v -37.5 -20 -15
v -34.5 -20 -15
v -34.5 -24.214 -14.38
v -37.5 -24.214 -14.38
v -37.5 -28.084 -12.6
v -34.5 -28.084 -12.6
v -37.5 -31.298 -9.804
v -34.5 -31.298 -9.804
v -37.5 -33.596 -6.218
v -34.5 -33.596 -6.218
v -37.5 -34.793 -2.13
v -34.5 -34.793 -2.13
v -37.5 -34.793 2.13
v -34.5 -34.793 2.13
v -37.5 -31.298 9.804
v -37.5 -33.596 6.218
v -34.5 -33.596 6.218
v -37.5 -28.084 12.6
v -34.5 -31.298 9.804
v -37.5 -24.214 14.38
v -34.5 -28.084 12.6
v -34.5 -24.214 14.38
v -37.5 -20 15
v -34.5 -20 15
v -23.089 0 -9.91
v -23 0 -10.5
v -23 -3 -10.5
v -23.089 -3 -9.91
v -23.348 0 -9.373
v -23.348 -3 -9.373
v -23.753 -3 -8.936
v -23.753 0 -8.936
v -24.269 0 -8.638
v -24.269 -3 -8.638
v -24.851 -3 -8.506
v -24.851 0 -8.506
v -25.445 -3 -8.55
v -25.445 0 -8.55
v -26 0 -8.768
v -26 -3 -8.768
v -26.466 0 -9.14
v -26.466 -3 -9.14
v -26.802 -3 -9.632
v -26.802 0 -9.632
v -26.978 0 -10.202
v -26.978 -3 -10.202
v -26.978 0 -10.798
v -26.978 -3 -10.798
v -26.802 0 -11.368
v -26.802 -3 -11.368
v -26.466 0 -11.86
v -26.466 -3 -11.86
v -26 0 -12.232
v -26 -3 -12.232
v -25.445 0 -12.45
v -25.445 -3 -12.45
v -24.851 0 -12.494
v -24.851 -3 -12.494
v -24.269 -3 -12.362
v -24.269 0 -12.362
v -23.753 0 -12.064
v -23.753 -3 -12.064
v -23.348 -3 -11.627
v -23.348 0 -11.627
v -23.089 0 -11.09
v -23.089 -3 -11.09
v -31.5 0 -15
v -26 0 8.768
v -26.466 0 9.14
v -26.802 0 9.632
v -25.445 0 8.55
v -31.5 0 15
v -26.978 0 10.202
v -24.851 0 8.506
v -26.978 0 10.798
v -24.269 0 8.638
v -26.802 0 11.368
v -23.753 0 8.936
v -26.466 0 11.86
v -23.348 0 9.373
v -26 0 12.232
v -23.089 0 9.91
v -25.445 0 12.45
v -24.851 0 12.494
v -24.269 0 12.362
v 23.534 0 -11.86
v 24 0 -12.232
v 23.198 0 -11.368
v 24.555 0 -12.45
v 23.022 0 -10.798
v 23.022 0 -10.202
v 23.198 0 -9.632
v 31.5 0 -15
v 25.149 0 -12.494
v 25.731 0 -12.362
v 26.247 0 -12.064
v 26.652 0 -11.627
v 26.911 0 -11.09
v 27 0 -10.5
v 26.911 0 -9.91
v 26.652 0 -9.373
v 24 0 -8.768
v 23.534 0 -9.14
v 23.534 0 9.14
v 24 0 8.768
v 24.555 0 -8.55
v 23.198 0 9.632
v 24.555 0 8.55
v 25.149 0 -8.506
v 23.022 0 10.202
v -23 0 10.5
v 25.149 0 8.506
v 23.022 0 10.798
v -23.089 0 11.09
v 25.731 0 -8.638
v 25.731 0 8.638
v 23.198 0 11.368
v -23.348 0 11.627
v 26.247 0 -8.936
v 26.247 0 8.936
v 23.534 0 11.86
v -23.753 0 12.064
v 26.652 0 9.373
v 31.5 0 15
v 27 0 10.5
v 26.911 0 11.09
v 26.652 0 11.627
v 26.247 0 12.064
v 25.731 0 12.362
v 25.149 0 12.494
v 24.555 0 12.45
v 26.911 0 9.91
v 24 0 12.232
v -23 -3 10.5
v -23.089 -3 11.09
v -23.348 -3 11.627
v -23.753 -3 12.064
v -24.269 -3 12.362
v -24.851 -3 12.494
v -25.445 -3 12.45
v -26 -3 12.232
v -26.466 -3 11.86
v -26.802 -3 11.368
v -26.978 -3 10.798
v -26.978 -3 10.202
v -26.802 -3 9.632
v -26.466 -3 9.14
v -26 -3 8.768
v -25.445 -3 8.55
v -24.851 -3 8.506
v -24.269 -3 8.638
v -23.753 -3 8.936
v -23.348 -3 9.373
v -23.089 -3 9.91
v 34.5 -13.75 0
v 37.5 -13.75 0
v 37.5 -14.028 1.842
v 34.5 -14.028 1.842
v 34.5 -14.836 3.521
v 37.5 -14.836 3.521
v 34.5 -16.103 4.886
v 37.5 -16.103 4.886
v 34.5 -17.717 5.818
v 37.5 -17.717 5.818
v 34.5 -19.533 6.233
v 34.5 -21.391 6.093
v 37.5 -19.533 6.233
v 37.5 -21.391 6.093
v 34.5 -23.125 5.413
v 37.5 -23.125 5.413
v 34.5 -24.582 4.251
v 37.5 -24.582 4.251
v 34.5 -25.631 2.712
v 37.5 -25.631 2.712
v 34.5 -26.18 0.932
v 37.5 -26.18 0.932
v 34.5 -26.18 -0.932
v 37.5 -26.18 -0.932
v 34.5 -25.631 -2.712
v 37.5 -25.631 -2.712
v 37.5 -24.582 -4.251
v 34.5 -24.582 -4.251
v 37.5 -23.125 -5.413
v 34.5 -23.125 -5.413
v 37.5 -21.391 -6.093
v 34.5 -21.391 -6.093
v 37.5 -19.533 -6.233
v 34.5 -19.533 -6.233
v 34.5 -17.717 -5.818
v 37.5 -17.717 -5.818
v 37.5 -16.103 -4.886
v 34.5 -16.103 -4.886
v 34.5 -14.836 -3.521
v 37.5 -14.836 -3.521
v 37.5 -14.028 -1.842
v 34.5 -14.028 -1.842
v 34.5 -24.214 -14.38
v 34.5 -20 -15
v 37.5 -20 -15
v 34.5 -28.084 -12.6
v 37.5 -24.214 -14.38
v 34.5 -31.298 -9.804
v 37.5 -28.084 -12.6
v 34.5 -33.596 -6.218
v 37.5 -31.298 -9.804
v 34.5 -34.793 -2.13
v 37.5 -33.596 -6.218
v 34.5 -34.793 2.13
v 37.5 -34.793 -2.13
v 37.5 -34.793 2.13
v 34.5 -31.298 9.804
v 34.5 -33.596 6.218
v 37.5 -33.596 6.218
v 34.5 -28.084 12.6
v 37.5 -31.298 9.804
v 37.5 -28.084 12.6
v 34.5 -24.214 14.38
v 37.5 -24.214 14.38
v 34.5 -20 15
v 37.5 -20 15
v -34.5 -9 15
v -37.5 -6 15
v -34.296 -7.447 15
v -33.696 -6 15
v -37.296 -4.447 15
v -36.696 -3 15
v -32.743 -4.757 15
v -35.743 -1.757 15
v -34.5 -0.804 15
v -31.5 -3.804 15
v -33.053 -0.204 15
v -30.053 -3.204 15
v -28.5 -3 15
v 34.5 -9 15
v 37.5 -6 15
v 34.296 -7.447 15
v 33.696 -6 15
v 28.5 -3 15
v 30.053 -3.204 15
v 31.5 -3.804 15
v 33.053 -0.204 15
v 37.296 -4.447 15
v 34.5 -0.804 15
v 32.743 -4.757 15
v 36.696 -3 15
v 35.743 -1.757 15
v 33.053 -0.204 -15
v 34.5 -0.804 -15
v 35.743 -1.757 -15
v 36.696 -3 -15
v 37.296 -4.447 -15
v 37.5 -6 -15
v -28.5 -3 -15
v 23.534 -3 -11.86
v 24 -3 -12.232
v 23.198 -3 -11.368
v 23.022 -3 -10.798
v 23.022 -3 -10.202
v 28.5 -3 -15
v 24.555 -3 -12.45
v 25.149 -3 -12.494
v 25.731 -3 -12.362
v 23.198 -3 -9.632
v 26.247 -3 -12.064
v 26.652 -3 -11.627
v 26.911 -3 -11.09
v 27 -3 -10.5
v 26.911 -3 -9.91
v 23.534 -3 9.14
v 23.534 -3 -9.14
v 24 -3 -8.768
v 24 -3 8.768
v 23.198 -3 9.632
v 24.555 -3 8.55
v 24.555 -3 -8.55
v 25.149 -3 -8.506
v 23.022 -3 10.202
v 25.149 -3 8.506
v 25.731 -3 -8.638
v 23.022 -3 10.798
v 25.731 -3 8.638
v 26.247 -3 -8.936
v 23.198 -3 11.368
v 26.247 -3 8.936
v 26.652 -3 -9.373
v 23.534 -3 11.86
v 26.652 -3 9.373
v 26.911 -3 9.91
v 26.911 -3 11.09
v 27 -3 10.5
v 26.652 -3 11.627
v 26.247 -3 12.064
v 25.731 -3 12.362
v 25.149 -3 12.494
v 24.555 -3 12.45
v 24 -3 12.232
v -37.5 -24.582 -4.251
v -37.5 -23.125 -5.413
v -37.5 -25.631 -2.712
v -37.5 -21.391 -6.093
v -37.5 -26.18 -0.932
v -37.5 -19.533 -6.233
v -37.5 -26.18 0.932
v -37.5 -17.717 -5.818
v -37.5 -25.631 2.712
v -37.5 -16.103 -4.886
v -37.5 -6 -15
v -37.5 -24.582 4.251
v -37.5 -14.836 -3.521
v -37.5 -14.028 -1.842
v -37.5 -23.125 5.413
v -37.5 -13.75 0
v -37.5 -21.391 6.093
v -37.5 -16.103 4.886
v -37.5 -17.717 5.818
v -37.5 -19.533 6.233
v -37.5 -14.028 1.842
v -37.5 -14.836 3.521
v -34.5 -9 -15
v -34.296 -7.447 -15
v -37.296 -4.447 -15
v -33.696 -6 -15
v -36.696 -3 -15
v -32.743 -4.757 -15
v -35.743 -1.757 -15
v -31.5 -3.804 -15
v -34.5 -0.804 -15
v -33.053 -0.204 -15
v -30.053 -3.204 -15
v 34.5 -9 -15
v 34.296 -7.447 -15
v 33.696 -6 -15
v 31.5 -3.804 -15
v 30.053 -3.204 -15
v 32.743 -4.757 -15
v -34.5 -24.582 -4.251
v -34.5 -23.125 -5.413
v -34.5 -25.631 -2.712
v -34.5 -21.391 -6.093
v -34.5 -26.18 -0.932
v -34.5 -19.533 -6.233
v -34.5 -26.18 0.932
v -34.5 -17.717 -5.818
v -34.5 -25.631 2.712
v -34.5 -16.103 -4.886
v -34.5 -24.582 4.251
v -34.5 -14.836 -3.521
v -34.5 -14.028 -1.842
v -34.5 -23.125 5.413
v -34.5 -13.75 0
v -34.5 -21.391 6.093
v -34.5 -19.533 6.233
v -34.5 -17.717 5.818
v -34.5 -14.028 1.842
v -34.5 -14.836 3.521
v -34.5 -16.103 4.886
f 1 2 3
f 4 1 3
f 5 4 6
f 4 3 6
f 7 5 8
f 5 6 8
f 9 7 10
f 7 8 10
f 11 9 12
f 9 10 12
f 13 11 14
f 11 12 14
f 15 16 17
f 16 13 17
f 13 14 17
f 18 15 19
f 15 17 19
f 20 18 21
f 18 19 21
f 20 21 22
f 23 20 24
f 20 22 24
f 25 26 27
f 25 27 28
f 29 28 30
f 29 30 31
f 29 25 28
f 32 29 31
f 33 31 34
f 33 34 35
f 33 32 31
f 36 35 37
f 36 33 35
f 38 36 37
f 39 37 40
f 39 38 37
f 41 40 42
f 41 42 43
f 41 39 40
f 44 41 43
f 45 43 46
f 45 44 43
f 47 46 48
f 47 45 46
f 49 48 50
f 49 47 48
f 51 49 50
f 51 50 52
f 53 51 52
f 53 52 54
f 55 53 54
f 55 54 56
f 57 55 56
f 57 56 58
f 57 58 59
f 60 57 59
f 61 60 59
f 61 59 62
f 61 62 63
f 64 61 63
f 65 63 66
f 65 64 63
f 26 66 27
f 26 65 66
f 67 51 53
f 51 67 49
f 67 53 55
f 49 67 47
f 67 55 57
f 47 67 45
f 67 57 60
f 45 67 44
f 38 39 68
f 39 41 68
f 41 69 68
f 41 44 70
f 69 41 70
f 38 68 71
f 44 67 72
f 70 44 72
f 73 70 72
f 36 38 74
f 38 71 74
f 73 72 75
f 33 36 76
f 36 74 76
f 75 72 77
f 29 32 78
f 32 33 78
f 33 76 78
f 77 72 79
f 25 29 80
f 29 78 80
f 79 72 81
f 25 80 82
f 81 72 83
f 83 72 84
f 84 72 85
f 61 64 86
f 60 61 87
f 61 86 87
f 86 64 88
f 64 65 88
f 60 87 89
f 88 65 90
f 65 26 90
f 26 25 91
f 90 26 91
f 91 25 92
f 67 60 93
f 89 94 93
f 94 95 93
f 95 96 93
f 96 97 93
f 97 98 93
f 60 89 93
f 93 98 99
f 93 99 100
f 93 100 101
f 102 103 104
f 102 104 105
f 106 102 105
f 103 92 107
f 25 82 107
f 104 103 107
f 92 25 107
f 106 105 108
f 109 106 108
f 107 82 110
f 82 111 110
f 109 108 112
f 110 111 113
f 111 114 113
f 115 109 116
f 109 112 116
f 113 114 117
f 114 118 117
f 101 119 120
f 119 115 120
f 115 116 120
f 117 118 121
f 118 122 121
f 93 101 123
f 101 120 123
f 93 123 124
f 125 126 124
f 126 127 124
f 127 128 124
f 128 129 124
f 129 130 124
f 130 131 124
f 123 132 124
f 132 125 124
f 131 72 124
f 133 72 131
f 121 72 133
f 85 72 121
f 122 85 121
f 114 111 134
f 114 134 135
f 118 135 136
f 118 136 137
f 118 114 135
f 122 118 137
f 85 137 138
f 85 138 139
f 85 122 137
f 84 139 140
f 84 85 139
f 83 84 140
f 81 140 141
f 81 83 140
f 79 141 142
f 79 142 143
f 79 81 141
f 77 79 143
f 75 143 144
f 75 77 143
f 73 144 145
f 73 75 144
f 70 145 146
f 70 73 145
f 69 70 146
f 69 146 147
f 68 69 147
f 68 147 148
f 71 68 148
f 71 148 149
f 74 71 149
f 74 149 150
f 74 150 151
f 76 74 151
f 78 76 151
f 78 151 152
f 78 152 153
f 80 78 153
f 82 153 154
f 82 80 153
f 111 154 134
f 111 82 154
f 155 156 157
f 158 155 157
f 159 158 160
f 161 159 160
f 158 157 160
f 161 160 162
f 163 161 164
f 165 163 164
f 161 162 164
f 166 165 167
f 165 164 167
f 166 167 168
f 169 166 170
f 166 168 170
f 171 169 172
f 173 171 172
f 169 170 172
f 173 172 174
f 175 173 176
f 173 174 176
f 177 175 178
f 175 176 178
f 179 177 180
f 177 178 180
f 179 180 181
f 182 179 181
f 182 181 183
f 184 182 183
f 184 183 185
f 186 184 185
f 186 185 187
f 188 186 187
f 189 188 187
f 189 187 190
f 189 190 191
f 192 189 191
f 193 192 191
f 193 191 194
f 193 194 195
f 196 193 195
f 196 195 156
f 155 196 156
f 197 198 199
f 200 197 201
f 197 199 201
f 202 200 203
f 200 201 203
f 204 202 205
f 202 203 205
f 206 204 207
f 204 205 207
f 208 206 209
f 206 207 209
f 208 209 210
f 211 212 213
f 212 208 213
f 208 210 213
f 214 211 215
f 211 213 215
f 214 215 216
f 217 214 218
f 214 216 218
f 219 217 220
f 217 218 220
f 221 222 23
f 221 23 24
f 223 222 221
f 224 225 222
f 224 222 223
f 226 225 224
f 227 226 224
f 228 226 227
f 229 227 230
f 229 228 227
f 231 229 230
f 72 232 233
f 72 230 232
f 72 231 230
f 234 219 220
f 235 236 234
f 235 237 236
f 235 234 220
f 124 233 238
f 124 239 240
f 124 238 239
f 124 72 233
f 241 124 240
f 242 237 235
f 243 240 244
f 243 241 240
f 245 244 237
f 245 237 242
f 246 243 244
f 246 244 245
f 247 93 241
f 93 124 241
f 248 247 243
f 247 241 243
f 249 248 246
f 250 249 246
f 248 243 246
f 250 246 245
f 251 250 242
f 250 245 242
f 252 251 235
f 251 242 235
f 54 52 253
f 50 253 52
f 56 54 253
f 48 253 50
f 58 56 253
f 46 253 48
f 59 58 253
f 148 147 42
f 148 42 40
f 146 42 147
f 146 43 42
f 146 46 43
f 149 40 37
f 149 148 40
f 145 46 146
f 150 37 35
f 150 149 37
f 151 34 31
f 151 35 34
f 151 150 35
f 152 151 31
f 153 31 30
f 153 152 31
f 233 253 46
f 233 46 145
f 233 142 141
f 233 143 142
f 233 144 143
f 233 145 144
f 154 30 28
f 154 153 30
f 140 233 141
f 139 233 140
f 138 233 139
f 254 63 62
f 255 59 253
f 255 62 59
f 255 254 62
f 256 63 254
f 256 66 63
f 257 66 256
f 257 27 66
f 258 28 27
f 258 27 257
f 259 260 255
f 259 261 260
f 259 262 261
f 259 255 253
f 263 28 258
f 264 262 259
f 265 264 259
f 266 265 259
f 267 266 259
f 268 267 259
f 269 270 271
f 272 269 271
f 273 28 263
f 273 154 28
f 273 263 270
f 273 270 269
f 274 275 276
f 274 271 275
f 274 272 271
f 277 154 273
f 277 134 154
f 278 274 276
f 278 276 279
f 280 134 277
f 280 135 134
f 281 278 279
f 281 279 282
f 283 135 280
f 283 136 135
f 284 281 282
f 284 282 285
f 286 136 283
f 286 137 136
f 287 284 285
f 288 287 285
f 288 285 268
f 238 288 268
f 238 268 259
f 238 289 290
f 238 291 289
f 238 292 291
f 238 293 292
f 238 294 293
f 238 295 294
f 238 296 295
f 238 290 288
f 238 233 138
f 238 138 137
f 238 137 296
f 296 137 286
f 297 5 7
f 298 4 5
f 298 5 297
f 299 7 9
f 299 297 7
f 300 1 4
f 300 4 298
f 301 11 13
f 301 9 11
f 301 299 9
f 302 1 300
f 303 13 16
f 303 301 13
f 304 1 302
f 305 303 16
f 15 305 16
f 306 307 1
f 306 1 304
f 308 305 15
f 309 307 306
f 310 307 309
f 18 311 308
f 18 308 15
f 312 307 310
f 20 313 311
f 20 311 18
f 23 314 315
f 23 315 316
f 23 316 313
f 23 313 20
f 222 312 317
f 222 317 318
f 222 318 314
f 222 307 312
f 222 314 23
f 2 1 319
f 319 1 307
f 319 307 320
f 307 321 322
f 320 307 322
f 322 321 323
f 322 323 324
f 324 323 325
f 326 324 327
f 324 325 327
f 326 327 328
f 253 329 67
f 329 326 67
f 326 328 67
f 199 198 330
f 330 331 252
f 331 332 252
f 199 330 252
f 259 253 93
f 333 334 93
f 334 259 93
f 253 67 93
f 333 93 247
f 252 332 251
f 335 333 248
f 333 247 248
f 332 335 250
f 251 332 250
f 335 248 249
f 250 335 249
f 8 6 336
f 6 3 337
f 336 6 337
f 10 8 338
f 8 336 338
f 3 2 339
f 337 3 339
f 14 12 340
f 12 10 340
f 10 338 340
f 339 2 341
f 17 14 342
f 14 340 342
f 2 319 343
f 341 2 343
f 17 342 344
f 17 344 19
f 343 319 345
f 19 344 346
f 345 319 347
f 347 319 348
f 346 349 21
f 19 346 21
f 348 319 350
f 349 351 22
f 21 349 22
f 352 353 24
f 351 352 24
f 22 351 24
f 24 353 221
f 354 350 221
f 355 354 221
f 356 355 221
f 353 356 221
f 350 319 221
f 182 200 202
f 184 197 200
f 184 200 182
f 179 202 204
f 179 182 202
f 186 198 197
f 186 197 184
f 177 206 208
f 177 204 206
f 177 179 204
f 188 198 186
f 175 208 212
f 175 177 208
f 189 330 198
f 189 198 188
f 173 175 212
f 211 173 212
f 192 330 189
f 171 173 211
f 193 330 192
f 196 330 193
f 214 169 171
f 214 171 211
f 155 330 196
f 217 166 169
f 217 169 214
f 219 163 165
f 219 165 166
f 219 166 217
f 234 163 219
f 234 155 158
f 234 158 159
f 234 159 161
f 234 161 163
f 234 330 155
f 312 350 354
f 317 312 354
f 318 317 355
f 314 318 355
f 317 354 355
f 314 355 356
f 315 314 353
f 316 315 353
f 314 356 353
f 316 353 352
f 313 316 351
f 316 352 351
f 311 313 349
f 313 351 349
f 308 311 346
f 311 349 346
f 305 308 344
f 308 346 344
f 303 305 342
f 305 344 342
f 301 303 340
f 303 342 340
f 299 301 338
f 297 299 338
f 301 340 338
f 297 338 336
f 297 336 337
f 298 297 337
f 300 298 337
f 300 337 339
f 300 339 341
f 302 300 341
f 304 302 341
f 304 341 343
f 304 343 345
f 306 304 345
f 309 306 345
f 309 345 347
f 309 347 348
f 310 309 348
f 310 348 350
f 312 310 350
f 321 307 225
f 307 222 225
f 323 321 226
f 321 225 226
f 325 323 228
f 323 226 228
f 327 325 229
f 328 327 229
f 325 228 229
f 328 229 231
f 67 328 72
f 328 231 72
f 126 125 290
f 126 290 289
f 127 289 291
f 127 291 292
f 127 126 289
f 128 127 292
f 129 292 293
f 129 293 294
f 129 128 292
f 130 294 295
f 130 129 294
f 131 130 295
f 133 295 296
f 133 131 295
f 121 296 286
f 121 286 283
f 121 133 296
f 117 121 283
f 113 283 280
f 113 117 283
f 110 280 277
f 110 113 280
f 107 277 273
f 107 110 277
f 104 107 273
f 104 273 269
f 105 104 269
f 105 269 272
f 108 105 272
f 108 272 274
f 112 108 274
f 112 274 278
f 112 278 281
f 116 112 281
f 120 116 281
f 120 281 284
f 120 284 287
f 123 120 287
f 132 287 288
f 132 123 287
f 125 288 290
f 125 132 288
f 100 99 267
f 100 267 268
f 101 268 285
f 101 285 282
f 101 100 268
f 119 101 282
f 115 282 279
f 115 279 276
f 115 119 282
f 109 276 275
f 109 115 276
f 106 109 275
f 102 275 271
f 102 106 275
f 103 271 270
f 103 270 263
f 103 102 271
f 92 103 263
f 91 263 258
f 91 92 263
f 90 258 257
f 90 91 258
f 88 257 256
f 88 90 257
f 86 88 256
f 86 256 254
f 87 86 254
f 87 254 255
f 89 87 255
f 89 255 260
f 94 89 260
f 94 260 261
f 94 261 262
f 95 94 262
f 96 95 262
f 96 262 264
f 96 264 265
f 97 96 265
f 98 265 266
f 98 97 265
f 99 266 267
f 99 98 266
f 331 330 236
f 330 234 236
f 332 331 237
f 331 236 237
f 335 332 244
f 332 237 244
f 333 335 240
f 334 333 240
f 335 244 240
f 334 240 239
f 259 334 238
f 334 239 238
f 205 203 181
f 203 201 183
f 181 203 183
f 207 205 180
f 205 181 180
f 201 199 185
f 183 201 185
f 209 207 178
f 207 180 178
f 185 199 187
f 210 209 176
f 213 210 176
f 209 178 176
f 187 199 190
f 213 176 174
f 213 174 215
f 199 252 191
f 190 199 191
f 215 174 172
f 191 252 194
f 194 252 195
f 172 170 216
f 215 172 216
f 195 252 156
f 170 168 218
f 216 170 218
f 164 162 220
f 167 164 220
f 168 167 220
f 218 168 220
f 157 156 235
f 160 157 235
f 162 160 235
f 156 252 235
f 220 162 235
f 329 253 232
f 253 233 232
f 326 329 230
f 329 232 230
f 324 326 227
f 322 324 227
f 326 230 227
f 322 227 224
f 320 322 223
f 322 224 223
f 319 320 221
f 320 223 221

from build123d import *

# Parameters (mm, degrees)
F0_W     = 75
F0_H     = 30
F0_R     = 2
F1_DEPTH = 3
F2_W     = 3
F2_H     = 30
F3_DEPTH = 37
F4_R     = 6.25
F5_DEPTH = 2500
F6_R     = 6


with BuildPart() as f1:
    # F0 (on Front) → F1 (new body)
    with BuildSketch(Plane.XZ):
        Rectangle(F0_W, F0_H)
        with Locations((-25, -10.5)):
            Circle(F0_R, mode=Mode.SUBTRACT)
        with Locations((25, -10.5)):
            Circle(F0_R, mode=Mode.SUBTRACT)
        with Locations((-25, 10.5)):
            Circle(F0_R, mode=Mode.SUBTRACT)
        with Locations((25, 10.5)):
            Circle(F0_R, mode=Mode.SUBTRACT)
    extrude(amount=F1_DEPTH)

    # F2 (on face) → F3 (join)
    with BuildSketch(Plane.XZ.offset(3)):
        with Locations((-36, 0)):
            Rectangle(F2_W, F2_H)
        with Locations((36, 0)):
            Rectangle(F2_W, F2_H)
    extrude(amount=F3_DEPTH)

    # F4 (on face) → F5 (cut)
    with BuildSketch(Plane.YZ.offset(37.5)):
        with Locations((-20, 0)):
            Circle(F4_R)
        with BuildLine():
            ThreePointArc((-20, -15), (-34.945094, 0), (-20, 15))
            Line((-20, 15), (-40, 15))
            Line((-40, 15), (-40, -15))
            Line((-40, -15), (-20, -15))
        make_face()
    extrude(amount=-F5_DEPTH, mode=Mode.SUBTRACT)

    # F6
    f6_edges = [f1.edges().sort_by_distance(p)[0] for p in [
        (37.5, 0, 0),
        (-37.5, 0, 0),
        (-34.5, -3, 0),
        (34.5, -3, 0),
    ]]
    fillet(f6_edges, radius=F6_R)


solid = f1.part
